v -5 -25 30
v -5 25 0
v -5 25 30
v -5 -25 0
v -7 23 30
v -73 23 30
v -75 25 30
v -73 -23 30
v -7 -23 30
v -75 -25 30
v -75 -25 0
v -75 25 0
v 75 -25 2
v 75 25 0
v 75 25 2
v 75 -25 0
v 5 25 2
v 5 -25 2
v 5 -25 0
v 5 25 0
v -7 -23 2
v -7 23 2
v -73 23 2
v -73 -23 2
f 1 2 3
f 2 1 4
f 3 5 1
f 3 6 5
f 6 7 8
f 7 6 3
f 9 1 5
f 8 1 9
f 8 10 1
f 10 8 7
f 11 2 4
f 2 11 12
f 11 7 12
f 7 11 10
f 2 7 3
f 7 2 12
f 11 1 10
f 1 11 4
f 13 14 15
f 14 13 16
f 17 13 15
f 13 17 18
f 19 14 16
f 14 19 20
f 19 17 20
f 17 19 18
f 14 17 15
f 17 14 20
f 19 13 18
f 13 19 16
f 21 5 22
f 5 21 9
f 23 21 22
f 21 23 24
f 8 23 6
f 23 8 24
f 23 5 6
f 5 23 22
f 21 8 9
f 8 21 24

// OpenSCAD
// Built by bench/smallmodels/features/compiler.py from a list of features.
$fn = 64;
difference() {
  difference() {
  union() {
    translate([-40, 0, 0]) translate([-35, -25, 0]) cube([70, 50, 30]);
    translate([40, 0, 0]) translate([-35, -25, 0]) cube([70, 50, 2]);
  }
  translate([-73, -23, 2]) cube([66, 46, 29]);  // shell, wall 2, open top
}
  union() {
    translate([-40, 0, 30]) rotate([0, 0, 0]) translate([-32.8, -22.8, 0]) cube([65.6, 45.6, 1.5]);
    translate([40, 0, -2]) rotate([0, 0, 0]) translate([-35, -25, 0]) cube([70, 50, 2]);
  }
}
